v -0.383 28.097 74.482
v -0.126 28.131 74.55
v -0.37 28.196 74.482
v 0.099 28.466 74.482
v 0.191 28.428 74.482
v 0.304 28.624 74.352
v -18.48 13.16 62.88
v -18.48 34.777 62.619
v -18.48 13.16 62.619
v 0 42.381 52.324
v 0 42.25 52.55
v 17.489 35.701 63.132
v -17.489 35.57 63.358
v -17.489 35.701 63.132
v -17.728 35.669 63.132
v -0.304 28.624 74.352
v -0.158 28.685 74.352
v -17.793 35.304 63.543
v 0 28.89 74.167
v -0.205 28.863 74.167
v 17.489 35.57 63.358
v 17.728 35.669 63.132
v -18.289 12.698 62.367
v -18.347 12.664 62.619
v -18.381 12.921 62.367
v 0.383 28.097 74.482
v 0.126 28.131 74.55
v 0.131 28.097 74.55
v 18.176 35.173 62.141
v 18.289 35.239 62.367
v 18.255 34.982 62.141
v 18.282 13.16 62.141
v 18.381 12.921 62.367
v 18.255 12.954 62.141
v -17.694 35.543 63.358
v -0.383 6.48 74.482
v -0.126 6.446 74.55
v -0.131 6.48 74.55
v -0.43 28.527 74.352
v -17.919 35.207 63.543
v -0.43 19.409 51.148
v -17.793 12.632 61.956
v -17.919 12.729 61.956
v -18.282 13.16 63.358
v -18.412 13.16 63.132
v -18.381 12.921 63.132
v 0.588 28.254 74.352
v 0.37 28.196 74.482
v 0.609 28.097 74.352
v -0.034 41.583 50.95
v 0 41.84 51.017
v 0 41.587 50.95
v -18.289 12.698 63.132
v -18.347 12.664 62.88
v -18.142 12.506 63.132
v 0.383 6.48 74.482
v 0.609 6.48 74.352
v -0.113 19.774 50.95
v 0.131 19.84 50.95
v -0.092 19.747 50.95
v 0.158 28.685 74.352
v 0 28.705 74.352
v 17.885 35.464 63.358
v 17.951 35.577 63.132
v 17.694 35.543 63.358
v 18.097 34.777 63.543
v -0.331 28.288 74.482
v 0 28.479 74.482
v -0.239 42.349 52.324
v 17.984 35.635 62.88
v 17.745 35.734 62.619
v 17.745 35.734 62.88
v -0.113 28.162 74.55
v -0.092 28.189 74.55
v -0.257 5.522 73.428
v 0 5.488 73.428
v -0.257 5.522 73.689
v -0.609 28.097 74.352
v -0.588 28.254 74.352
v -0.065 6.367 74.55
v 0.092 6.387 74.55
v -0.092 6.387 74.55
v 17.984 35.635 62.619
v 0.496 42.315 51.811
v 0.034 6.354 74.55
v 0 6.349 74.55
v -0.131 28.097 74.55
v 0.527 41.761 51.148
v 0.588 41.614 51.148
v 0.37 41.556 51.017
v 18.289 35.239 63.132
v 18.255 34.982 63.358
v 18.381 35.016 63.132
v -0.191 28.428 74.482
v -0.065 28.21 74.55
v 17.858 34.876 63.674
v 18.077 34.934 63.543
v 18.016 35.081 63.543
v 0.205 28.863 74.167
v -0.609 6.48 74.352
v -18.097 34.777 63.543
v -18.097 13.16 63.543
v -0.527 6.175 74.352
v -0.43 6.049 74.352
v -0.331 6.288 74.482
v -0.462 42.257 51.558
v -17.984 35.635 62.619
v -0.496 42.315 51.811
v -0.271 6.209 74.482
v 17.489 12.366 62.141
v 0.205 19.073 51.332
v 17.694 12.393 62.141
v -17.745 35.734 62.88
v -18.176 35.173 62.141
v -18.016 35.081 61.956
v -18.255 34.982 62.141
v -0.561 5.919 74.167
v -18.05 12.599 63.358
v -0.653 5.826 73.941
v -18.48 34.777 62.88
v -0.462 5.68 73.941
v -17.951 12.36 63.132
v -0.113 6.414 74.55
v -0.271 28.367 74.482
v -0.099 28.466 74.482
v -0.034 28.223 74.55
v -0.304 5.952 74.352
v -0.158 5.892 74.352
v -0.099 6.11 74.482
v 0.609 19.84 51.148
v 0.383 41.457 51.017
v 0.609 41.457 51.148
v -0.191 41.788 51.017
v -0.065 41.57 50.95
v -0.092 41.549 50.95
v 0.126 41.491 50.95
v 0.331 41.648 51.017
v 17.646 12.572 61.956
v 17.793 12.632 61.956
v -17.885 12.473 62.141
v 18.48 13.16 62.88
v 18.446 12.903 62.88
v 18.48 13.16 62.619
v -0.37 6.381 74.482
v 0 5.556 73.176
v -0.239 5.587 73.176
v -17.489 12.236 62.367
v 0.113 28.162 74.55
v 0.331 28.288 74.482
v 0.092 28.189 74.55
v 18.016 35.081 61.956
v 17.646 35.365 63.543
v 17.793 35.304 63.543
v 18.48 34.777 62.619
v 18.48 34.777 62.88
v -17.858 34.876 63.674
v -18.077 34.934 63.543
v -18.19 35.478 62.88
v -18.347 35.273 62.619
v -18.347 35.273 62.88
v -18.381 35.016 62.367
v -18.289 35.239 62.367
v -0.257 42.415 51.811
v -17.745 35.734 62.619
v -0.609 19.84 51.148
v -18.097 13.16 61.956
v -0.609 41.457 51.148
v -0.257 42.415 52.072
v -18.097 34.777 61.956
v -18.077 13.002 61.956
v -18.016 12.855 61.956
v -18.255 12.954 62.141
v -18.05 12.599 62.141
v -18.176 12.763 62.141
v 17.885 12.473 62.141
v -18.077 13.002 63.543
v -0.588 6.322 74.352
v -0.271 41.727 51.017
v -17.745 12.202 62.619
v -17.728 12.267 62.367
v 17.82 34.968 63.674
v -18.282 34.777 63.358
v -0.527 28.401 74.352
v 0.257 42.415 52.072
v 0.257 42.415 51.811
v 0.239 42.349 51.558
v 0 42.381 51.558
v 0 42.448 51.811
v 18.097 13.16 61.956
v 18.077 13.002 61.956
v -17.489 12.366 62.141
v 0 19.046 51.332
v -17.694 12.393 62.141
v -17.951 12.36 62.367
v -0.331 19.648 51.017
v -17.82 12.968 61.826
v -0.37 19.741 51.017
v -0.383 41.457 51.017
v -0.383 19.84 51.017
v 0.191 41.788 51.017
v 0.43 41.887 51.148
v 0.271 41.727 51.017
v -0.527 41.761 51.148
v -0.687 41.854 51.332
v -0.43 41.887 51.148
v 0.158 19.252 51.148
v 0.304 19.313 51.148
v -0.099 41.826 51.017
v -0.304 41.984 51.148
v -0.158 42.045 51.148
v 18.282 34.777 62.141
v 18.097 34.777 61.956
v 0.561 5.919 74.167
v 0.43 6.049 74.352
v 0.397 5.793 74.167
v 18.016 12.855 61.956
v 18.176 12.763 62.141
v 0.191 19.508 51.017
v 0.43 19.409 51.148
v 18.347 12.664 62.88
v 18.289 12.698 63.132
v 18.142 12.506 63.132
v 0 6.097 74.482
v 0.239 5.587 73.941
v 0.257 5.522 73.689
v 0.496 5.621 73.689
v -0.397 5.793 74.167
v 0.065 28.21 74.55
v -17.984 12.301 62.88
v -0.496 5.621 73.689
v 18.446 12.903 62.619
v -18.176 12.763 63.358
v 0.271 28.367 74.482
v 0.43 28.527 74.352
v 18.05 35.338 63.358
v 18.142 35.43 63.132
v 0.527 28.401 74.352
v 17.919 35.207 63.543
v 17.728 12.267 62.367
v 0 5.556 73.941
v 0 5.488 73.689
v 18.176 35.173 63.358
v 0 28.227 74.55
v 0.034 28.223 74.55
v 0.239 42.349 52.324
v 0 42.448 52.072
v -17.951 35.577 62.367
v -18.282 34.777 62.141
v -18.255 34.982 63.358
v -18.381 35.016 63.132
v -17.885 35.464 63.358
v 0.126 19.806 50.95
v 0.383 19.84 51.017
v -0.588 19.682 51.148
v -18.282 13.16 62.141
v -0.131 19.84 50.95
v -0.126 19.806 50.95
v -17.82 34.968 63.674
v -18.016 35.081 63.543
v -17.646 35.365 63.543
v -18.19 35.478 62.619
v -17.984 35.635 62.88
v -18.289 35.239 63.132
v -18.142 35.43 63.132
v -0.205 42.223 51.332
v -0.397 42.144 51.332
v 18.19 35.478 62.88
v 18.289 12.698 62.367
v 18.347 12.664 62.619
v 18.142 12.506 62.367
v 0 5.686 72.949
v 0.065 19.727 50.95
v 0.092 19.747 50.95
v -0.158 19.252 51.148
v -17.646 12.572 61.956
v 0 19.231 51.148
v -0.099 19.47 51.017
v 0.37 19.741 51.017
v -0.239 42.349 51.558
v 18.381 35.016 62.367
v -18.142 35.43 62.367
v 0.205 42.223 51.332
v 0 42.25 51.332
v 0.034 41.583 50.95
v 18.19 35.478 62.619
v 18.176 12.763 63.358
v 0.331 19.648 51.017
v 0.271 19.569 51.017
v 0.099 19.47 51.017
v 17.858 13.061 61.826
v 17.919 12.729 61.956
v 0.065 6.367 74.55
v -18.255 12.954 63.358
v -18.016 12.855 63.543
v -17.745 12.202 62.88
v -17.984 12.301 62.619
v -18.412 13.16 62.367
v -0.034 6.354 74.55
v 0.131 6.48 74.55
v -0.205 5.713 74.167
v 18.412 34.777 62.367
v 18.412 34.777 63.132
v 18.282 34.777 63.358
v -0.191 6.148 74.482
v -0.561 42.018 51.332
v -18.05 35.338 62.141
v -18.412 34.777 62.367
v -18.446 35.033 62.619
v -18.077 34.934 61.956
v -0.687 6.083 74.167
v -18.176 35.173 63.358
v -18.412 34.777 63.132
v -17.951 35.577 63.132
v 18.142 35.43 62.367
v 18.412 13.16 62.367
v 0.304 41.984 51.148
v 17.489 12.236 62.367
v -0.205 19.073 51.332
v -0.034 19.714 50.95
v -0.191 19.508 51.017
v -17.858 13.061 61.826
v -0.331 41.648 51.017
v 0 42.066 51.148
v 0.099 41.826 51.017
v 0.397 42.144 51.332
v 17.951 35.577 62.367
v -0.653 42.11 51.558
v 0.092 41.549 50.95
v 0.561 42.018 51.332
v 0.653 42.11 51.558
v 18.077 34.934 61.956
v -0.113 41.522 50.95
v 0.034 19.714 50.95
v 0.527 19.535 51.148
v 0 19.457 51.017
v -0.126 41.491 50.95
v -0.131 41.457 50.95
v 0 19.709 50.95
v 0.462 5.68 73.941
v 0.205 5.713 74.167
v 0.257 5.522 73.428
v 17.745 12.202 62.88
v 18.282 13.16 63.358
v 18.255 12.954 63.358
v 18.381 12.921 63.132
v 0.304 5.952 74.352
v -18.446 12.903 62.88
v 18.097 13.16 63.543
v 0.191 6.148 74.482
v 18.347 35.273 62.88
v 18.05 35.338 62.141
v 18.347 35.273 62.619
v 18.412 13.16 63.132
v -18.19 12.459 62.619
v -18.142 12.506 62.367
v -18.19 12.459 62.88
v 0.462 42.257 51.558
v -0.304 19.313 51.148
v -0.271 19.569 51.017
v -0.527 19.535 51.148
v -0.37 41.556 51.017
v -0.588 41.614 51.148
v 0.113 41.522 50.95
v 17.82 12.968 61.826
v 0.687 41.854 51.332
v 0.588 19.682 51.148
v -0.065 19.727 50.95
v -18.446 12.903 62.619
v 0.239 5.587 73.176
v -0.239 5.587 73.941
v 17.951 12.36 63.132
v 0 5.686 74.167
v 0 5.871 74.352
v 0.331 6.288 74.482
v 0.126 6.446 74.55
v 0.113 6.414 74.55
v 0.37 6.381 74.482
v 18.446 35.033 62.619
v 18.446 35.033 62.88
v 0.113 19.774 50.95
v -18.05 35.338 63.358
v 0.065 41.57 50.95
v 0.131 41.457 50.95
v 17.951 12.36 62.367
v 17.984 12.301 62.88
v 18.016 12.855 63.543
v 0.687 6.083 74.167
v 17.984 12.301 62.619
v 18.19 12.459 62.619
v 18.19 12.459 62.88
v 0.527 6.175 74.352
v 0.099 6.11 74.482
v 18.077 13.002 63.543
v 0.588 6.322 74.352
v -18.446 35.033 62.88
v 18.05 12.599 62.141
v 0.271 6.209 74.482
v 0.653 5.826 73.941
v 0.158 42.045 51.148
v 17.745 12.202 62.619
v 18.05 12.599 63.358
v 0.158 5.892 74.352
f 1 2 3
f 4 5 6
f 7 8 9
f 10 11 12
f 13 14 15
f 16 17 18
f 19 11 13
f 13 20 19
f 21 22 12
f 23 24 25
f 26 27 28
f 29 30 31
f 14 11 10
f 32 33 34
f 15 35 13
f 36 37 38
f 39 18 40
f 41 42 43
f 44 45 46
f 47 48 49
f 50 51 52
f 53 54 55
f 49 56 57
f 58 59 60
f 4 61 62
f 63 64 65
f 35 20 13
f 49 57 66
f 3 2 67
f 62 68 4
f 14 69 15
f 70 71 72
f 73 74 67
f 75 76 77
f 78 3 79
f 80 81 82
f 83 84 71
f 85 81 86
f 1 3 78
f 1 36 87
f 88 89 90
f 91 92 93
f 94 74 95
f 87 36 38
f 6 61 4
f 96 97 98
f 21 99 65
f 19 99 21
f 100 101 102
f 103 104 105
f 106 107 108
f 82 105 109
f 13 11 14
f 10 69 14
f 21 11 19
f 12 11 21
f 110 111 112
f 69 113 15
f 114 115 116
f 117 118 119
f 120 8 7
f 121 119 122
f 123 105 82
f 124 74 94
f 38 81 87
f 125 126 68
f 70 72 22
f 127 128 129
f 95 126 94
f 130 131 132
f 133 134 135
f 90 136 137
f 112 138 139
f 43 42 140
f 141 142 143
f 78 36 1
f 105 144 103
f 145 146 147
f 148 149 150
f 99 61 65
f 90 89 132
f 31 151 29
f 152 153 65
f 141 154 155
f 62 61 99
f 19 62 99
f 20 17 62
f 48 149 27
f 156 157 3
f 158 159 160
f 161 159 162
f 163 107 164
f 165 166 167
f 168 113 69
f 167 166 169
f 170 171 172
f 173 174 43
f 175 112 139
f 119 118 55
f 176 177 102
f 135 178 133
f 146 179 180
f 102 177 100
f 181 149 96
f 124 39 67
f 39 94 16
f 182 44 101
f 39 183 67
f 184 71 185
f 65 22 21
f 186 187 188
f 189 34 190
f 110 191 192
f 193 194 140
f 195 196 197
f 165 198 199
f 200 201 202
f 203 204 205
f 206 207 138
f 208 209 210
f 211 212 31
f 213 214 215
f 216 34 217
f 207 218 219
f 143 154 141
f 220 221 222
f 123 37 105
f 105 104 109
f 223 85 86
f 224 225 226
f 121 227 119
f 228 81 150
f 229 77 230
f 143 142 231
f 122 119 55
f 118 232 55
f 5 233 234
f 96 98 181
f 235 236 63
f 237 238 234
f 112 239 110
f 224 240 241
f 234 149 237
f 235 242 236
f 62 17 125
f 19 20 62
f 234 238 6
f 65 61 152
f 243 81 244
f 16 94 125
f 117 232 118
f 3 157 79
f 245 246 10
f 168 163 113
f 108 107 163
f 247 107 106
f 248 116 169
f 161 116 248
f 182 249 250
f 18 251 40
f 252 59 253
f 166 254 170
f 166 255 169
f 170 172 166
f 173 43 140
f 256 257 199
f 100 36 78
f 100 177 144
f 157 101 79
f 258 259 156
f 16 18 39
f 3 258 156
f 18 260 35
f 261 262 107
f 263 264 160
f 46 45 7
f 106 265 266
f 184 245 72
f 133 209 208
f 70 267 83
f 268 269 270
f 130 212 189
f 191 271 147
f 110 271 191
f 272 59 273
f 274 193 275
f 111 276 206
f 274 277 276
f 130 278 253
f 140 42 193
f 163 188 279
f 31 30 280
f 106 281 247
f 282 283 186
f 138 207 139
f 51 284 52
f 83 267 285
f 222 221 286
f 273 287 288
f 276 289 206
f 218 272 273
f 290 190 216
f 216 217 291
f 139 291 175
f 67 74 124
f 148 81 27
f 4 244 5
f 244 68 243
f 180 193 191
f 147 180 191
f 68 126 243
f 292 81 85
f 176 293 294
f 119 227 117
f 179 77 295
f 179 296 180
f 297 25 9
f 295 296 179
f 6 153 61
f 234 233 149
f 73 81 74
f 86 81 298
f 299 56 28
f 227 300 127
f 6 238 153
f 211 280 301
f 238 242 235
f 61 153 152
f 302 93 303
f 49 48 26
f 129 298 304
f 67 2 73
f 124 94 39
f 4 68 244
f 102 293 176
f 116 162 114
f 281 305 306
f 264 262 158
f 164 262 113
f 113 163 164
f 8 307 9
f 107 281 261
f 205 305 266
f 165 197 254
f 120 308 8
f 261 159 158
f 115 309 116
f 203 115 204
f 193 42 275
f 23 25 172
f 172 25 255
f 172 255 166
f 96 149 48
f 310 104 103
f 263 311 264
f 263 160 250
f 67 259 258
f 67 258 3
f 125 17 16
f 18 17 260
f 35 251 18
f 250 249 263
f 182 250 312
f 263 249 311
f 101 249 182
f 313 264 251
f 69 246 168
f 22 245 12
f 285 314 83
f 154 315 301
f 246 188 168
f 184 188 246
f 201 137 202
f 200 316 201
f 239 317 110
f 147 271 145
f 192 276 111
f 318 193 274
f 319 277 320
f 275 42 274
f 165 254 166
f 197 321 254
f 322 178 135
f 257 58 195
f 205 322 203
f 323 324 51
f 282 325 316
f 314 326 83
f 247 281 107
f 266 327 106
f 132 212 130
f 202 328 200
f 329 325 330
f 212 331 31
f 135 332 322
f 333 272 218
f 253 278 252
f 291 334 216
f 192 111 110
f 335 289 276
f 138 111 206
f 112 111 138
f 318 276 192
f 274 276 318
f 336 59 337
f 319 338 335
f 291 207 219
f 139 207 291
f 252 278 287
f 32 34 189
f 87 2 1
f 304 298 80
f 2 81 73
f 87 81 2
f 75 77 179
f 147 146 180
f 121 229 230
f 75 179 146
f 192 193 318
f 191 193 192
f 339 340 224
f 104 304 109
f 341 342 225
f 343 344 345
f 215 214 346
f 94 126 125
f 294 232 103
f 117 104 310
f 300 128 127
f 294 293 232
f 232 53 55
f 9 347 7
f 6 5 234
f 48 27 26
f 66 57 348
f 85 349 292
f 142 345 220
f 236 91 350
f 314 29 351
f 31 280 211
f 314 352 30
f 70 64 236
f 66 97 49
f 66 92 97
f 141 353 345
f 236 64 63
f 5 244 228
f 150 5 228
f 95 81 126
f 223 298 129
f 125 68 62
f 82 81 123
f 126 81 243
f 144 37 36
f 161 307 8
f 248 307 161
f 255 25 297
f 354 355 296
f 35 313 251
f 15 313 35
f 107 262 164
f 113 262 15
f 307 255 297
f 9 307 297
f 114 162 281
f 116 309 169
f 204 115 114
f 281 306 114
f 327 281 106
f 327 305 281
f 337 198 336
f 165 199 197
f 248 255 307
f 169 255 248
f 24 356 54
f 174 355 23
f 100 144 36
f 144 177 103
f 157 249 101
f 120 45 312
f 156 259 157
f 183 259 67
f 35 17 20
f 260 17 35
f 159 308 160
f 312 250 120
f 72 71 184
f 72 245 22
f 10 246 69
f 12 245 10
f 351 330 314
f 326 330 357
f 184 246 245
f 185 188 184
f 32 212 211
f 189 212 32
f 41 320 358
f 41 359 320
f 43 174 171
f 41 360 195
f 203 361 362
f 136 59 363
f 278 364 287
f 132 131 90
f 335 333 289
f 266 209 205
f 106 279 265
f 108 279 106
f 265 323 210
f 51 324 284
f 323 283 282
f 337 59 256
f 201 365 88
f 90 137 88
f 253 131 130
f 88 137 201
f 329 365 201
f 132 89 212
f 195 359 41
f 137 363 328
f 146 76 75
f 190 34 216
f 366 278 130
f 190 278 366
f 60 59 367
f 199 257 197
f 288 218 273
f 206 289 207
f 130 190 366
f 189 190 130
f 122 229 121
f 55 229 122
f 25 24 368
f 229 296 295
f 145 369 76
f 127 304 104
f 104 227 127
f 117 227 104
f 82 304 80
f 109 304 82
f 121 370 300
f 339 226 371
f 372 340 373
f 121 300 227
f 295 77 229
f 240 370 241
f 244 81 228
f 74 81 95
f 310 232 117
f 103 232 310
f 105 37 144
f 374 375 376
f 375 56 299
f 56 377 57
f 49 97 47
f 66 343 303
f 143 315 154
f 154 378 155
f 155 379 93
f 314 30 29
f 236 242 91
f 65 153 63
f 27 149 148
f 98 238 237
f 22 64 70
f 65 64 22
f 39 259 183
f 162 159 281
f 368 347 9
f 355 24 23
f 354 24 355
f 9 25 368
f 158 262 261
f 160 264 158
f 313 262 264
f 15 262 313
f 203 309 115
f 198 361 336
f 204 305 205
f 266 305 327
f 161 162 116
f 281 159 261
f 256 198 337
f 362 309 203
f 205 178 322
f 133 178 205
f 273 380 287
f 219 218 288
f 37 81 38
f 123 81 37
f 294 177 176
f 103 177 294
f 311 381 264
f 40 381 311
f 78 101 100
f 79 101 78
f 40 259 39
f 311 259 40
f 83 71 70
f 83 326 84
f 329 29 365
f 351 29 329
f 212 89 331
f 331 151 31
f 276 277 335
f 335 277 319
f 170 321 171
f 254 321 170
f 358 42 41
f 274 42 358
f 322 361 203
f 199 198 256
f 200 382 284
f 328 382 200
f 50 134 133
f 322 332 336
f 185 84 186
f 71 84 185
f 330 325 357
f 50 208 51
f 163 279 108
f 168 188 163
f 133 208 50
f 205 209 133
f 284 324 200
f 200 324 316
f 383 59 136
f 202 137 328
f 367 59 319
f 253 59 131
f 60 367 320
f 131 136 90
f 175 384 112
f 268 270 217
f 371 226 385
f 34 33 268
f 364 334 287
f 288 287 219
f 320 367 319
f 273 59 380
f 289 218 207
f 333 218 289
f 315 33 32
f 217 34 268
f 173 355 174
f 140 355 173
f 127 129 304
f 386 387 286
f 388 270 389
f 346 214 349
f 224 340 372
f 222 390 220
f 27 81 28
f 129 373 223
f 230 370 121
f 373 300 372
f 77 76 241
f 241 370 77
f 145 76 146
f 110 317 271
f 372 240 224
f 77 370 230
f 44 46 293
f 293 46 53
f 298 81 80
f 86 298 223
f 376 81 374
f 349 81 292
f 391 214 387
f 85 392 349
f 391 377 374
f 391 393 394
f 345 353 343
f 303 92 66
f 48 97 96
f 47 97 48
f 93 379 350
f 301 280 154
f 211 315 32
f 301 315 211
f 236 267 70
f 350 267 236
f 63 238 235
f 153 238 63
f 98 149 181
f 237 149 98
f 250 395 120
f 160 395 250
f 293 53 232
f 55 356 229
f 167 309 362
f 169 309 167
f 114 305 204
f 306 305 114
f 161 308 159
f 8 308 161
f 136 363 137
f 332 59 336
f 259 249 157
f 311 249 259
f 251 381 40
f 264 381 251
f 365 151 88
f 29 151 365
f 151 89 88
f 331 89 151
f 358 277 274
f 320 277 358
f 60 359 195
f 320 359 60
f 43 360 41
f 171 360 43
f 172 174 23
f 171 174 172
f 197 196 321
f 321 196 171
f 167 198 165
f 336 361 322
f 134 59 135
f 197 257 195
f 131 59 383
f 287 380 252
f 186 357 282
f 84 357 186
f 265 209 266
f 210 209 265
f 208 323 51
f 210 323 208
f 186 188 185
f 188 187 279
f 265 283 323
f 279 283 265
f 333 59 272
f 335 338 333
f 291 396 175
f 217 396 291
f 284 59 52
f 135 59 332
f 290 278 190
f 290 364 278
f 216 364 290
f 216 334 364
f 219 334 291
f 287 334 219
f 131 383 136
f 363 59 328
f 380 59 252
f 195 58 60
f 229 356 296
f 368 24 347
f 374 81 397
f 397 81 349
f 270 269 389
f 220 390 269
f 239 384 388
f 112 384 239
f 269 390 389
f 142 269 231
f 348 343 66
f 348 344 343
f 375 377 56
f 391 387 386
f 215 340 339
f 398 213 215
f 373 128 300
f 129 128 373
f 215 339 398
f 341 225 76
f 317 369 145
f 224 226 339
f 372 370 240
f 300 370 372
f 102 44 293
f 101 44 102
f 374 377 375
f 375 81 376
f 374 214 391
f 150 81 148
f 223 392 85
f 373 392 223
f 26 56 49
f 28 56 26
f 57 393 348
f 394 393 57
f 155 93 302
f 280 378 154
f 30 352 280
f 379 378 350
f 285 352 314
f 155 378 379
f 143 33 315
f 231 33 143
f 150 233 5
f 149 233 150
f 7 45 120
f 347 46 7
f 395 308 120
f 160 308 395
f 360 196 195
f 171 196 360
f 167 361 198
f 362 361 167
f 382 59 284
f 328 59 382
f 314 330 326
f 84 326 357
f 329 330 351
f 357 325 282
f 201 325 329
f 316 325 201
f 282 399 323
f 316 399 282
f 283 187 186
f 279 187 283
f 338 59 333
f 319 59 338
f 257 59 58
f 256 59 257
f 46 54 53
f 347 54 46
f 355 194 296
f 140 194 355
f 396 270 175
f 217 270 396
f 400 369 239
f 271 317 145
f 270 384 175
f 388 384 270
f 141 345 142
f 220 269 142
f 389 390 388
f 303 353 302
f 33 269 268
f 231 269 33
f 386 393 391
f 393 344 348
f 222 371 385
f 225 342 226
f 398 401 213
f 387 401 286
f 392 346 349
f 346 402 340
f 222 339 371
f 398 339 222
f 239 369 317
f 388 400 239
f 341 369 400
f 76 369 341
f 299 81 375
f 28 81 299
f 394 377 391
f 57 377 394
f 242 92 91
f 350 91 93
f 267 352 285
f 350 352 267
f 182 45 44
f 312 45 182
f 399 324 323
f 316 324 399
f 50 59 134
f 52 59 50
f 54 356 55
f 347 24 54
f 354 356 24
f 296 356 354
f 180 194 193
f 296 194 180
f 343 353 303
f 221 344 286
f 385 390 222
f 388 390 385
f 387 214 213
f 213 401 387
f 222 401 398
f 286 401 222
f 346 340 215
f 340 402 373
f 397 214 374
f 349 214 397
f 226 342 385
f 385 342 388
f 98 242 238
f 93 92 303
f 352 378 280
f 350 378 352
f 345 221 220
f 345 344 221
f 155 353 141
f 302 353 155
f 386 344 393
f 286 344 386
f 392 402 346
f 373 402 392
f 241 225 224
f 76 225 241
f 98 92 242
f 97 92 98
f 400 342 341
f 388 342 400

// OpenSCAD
// file: def.scad
inf = 1000;

round_radius = 1;
sticker_margin = 2.5;
sticker_round_radius = 0.75;

phi = (sqrt(5) + 1) / 2;
outer_radius = 80;
edge_length = outer_radius / sqrt(phi * phi * phi * phi + 1) * 2;
inner_radius = sqrt(outer_radius * outer_radius - (edge_length / 2 / cos(54)) * (edge_length / 2 / cos(54)));
cut1_length = edge_length / (1 / (phi * phi) + 2) * 3;
center_cut_length = edge_length * (sin(54) + 1);
cut1_dis = inner_radius * (center_cut_length - cut1_length) / (center_cut_length - edge_length);

theta = atan(edge_length / 2 * tan(54) / inner_radius);

face_inner_radius = edge_length / 2 * tan(54);
face_center_length = edge_length * tan(54) / cos(18);
sticker_cut1_dis = face_inner_radius * (face_center_length - cut1_length) / (face_center_length - edge_length);
sticker_dif_cut1_dis = sticker_cut1_dis - round_radius * tan(theta) + round_radius - sticker_margin;
sticker_int_cut1_dis = sticker_cut1_dis + round_radius / tan(theta) - round_radius + sticker_margin;
sticker_dif_cut2_dis = face_inner_radius - round_radius * tan(theta) + round_radius - sticker_margin;

module _int_cut1() {
    translate([-inf, -inf, cut1_dis + round_radius])
        cube([inf * 2, inf * 2, inf]);
}

module _dif_cut1() {
    translate([-inf, -inf, cut1_dis - round_radius])
        cube([inf * 2, inf * 2, inf]);
}

module _sticker_int_cut1() {
    rotate([-90, 0, 0])
        translate([-inf, -inf, sticker_int_cut1_dis])
            cube([inf * 2, inf * 2, inf]);
}

module _sticker_dif_cut1() {
    rotate([-90, 0, 0])
        translate([-inf, -inf, sticker_dif_cut1_dis])
            cube([inf * 2, inf * 2, inf]);
}

module _sticker_dif_cut2() {
    rotate([-90, 0, 0])
        translate([-inf, -inf, sticker_dif_cut2_dis])
            cube([inf * 2, inf * 2, inf]);
}

module _base() {
    intersection_for(vec = [[0, 0, 0], [90, 90, 0], [90, 0, 90]])
        intersection_for(ang = [theta, -theta, 180 + theta, 180 - theta])
            rotate(vec)
                rotate([0, ang, 0])
                    translate([-inf, -inf, -inner_radius + round_radius])
                        cube([inf * 2, inf * 2, inf]);
}

module _sticker_base() {
    difference() {
        cube([inf, inf, 0.1], center = true);
        for (ang = [0 : 72 : 288])
            rotate([0, 0, ang])
                _sticker_dif_cut2();
    }
}

module _selector_base(dis) {
    intersection_for(vec = [[0, 0, 0], [90, 90, 0], [90, 0, 90]])
        intersection_for(ang = [theta, -theta, 180 + theta, 180 - theta])
            rotate(vec)
                rotate([0, ang, 0])
                    translate([-inf, -inf, -dis])
                        cube([inf * 2, inf * 2, inf]);
}
// main file
include <def.scad>

module corner_block() {
minkowski() {
        intersection() {
            _base();
            intersection_for(vec = [[0, theta, 0], [0, -theta, 0], [-90 + theta, 0, 0]])
                rotate(vec)
                    _int_cut1();
        }
        sphere(r = round_radius, $fn = 24);
    }
}

corner_block();
